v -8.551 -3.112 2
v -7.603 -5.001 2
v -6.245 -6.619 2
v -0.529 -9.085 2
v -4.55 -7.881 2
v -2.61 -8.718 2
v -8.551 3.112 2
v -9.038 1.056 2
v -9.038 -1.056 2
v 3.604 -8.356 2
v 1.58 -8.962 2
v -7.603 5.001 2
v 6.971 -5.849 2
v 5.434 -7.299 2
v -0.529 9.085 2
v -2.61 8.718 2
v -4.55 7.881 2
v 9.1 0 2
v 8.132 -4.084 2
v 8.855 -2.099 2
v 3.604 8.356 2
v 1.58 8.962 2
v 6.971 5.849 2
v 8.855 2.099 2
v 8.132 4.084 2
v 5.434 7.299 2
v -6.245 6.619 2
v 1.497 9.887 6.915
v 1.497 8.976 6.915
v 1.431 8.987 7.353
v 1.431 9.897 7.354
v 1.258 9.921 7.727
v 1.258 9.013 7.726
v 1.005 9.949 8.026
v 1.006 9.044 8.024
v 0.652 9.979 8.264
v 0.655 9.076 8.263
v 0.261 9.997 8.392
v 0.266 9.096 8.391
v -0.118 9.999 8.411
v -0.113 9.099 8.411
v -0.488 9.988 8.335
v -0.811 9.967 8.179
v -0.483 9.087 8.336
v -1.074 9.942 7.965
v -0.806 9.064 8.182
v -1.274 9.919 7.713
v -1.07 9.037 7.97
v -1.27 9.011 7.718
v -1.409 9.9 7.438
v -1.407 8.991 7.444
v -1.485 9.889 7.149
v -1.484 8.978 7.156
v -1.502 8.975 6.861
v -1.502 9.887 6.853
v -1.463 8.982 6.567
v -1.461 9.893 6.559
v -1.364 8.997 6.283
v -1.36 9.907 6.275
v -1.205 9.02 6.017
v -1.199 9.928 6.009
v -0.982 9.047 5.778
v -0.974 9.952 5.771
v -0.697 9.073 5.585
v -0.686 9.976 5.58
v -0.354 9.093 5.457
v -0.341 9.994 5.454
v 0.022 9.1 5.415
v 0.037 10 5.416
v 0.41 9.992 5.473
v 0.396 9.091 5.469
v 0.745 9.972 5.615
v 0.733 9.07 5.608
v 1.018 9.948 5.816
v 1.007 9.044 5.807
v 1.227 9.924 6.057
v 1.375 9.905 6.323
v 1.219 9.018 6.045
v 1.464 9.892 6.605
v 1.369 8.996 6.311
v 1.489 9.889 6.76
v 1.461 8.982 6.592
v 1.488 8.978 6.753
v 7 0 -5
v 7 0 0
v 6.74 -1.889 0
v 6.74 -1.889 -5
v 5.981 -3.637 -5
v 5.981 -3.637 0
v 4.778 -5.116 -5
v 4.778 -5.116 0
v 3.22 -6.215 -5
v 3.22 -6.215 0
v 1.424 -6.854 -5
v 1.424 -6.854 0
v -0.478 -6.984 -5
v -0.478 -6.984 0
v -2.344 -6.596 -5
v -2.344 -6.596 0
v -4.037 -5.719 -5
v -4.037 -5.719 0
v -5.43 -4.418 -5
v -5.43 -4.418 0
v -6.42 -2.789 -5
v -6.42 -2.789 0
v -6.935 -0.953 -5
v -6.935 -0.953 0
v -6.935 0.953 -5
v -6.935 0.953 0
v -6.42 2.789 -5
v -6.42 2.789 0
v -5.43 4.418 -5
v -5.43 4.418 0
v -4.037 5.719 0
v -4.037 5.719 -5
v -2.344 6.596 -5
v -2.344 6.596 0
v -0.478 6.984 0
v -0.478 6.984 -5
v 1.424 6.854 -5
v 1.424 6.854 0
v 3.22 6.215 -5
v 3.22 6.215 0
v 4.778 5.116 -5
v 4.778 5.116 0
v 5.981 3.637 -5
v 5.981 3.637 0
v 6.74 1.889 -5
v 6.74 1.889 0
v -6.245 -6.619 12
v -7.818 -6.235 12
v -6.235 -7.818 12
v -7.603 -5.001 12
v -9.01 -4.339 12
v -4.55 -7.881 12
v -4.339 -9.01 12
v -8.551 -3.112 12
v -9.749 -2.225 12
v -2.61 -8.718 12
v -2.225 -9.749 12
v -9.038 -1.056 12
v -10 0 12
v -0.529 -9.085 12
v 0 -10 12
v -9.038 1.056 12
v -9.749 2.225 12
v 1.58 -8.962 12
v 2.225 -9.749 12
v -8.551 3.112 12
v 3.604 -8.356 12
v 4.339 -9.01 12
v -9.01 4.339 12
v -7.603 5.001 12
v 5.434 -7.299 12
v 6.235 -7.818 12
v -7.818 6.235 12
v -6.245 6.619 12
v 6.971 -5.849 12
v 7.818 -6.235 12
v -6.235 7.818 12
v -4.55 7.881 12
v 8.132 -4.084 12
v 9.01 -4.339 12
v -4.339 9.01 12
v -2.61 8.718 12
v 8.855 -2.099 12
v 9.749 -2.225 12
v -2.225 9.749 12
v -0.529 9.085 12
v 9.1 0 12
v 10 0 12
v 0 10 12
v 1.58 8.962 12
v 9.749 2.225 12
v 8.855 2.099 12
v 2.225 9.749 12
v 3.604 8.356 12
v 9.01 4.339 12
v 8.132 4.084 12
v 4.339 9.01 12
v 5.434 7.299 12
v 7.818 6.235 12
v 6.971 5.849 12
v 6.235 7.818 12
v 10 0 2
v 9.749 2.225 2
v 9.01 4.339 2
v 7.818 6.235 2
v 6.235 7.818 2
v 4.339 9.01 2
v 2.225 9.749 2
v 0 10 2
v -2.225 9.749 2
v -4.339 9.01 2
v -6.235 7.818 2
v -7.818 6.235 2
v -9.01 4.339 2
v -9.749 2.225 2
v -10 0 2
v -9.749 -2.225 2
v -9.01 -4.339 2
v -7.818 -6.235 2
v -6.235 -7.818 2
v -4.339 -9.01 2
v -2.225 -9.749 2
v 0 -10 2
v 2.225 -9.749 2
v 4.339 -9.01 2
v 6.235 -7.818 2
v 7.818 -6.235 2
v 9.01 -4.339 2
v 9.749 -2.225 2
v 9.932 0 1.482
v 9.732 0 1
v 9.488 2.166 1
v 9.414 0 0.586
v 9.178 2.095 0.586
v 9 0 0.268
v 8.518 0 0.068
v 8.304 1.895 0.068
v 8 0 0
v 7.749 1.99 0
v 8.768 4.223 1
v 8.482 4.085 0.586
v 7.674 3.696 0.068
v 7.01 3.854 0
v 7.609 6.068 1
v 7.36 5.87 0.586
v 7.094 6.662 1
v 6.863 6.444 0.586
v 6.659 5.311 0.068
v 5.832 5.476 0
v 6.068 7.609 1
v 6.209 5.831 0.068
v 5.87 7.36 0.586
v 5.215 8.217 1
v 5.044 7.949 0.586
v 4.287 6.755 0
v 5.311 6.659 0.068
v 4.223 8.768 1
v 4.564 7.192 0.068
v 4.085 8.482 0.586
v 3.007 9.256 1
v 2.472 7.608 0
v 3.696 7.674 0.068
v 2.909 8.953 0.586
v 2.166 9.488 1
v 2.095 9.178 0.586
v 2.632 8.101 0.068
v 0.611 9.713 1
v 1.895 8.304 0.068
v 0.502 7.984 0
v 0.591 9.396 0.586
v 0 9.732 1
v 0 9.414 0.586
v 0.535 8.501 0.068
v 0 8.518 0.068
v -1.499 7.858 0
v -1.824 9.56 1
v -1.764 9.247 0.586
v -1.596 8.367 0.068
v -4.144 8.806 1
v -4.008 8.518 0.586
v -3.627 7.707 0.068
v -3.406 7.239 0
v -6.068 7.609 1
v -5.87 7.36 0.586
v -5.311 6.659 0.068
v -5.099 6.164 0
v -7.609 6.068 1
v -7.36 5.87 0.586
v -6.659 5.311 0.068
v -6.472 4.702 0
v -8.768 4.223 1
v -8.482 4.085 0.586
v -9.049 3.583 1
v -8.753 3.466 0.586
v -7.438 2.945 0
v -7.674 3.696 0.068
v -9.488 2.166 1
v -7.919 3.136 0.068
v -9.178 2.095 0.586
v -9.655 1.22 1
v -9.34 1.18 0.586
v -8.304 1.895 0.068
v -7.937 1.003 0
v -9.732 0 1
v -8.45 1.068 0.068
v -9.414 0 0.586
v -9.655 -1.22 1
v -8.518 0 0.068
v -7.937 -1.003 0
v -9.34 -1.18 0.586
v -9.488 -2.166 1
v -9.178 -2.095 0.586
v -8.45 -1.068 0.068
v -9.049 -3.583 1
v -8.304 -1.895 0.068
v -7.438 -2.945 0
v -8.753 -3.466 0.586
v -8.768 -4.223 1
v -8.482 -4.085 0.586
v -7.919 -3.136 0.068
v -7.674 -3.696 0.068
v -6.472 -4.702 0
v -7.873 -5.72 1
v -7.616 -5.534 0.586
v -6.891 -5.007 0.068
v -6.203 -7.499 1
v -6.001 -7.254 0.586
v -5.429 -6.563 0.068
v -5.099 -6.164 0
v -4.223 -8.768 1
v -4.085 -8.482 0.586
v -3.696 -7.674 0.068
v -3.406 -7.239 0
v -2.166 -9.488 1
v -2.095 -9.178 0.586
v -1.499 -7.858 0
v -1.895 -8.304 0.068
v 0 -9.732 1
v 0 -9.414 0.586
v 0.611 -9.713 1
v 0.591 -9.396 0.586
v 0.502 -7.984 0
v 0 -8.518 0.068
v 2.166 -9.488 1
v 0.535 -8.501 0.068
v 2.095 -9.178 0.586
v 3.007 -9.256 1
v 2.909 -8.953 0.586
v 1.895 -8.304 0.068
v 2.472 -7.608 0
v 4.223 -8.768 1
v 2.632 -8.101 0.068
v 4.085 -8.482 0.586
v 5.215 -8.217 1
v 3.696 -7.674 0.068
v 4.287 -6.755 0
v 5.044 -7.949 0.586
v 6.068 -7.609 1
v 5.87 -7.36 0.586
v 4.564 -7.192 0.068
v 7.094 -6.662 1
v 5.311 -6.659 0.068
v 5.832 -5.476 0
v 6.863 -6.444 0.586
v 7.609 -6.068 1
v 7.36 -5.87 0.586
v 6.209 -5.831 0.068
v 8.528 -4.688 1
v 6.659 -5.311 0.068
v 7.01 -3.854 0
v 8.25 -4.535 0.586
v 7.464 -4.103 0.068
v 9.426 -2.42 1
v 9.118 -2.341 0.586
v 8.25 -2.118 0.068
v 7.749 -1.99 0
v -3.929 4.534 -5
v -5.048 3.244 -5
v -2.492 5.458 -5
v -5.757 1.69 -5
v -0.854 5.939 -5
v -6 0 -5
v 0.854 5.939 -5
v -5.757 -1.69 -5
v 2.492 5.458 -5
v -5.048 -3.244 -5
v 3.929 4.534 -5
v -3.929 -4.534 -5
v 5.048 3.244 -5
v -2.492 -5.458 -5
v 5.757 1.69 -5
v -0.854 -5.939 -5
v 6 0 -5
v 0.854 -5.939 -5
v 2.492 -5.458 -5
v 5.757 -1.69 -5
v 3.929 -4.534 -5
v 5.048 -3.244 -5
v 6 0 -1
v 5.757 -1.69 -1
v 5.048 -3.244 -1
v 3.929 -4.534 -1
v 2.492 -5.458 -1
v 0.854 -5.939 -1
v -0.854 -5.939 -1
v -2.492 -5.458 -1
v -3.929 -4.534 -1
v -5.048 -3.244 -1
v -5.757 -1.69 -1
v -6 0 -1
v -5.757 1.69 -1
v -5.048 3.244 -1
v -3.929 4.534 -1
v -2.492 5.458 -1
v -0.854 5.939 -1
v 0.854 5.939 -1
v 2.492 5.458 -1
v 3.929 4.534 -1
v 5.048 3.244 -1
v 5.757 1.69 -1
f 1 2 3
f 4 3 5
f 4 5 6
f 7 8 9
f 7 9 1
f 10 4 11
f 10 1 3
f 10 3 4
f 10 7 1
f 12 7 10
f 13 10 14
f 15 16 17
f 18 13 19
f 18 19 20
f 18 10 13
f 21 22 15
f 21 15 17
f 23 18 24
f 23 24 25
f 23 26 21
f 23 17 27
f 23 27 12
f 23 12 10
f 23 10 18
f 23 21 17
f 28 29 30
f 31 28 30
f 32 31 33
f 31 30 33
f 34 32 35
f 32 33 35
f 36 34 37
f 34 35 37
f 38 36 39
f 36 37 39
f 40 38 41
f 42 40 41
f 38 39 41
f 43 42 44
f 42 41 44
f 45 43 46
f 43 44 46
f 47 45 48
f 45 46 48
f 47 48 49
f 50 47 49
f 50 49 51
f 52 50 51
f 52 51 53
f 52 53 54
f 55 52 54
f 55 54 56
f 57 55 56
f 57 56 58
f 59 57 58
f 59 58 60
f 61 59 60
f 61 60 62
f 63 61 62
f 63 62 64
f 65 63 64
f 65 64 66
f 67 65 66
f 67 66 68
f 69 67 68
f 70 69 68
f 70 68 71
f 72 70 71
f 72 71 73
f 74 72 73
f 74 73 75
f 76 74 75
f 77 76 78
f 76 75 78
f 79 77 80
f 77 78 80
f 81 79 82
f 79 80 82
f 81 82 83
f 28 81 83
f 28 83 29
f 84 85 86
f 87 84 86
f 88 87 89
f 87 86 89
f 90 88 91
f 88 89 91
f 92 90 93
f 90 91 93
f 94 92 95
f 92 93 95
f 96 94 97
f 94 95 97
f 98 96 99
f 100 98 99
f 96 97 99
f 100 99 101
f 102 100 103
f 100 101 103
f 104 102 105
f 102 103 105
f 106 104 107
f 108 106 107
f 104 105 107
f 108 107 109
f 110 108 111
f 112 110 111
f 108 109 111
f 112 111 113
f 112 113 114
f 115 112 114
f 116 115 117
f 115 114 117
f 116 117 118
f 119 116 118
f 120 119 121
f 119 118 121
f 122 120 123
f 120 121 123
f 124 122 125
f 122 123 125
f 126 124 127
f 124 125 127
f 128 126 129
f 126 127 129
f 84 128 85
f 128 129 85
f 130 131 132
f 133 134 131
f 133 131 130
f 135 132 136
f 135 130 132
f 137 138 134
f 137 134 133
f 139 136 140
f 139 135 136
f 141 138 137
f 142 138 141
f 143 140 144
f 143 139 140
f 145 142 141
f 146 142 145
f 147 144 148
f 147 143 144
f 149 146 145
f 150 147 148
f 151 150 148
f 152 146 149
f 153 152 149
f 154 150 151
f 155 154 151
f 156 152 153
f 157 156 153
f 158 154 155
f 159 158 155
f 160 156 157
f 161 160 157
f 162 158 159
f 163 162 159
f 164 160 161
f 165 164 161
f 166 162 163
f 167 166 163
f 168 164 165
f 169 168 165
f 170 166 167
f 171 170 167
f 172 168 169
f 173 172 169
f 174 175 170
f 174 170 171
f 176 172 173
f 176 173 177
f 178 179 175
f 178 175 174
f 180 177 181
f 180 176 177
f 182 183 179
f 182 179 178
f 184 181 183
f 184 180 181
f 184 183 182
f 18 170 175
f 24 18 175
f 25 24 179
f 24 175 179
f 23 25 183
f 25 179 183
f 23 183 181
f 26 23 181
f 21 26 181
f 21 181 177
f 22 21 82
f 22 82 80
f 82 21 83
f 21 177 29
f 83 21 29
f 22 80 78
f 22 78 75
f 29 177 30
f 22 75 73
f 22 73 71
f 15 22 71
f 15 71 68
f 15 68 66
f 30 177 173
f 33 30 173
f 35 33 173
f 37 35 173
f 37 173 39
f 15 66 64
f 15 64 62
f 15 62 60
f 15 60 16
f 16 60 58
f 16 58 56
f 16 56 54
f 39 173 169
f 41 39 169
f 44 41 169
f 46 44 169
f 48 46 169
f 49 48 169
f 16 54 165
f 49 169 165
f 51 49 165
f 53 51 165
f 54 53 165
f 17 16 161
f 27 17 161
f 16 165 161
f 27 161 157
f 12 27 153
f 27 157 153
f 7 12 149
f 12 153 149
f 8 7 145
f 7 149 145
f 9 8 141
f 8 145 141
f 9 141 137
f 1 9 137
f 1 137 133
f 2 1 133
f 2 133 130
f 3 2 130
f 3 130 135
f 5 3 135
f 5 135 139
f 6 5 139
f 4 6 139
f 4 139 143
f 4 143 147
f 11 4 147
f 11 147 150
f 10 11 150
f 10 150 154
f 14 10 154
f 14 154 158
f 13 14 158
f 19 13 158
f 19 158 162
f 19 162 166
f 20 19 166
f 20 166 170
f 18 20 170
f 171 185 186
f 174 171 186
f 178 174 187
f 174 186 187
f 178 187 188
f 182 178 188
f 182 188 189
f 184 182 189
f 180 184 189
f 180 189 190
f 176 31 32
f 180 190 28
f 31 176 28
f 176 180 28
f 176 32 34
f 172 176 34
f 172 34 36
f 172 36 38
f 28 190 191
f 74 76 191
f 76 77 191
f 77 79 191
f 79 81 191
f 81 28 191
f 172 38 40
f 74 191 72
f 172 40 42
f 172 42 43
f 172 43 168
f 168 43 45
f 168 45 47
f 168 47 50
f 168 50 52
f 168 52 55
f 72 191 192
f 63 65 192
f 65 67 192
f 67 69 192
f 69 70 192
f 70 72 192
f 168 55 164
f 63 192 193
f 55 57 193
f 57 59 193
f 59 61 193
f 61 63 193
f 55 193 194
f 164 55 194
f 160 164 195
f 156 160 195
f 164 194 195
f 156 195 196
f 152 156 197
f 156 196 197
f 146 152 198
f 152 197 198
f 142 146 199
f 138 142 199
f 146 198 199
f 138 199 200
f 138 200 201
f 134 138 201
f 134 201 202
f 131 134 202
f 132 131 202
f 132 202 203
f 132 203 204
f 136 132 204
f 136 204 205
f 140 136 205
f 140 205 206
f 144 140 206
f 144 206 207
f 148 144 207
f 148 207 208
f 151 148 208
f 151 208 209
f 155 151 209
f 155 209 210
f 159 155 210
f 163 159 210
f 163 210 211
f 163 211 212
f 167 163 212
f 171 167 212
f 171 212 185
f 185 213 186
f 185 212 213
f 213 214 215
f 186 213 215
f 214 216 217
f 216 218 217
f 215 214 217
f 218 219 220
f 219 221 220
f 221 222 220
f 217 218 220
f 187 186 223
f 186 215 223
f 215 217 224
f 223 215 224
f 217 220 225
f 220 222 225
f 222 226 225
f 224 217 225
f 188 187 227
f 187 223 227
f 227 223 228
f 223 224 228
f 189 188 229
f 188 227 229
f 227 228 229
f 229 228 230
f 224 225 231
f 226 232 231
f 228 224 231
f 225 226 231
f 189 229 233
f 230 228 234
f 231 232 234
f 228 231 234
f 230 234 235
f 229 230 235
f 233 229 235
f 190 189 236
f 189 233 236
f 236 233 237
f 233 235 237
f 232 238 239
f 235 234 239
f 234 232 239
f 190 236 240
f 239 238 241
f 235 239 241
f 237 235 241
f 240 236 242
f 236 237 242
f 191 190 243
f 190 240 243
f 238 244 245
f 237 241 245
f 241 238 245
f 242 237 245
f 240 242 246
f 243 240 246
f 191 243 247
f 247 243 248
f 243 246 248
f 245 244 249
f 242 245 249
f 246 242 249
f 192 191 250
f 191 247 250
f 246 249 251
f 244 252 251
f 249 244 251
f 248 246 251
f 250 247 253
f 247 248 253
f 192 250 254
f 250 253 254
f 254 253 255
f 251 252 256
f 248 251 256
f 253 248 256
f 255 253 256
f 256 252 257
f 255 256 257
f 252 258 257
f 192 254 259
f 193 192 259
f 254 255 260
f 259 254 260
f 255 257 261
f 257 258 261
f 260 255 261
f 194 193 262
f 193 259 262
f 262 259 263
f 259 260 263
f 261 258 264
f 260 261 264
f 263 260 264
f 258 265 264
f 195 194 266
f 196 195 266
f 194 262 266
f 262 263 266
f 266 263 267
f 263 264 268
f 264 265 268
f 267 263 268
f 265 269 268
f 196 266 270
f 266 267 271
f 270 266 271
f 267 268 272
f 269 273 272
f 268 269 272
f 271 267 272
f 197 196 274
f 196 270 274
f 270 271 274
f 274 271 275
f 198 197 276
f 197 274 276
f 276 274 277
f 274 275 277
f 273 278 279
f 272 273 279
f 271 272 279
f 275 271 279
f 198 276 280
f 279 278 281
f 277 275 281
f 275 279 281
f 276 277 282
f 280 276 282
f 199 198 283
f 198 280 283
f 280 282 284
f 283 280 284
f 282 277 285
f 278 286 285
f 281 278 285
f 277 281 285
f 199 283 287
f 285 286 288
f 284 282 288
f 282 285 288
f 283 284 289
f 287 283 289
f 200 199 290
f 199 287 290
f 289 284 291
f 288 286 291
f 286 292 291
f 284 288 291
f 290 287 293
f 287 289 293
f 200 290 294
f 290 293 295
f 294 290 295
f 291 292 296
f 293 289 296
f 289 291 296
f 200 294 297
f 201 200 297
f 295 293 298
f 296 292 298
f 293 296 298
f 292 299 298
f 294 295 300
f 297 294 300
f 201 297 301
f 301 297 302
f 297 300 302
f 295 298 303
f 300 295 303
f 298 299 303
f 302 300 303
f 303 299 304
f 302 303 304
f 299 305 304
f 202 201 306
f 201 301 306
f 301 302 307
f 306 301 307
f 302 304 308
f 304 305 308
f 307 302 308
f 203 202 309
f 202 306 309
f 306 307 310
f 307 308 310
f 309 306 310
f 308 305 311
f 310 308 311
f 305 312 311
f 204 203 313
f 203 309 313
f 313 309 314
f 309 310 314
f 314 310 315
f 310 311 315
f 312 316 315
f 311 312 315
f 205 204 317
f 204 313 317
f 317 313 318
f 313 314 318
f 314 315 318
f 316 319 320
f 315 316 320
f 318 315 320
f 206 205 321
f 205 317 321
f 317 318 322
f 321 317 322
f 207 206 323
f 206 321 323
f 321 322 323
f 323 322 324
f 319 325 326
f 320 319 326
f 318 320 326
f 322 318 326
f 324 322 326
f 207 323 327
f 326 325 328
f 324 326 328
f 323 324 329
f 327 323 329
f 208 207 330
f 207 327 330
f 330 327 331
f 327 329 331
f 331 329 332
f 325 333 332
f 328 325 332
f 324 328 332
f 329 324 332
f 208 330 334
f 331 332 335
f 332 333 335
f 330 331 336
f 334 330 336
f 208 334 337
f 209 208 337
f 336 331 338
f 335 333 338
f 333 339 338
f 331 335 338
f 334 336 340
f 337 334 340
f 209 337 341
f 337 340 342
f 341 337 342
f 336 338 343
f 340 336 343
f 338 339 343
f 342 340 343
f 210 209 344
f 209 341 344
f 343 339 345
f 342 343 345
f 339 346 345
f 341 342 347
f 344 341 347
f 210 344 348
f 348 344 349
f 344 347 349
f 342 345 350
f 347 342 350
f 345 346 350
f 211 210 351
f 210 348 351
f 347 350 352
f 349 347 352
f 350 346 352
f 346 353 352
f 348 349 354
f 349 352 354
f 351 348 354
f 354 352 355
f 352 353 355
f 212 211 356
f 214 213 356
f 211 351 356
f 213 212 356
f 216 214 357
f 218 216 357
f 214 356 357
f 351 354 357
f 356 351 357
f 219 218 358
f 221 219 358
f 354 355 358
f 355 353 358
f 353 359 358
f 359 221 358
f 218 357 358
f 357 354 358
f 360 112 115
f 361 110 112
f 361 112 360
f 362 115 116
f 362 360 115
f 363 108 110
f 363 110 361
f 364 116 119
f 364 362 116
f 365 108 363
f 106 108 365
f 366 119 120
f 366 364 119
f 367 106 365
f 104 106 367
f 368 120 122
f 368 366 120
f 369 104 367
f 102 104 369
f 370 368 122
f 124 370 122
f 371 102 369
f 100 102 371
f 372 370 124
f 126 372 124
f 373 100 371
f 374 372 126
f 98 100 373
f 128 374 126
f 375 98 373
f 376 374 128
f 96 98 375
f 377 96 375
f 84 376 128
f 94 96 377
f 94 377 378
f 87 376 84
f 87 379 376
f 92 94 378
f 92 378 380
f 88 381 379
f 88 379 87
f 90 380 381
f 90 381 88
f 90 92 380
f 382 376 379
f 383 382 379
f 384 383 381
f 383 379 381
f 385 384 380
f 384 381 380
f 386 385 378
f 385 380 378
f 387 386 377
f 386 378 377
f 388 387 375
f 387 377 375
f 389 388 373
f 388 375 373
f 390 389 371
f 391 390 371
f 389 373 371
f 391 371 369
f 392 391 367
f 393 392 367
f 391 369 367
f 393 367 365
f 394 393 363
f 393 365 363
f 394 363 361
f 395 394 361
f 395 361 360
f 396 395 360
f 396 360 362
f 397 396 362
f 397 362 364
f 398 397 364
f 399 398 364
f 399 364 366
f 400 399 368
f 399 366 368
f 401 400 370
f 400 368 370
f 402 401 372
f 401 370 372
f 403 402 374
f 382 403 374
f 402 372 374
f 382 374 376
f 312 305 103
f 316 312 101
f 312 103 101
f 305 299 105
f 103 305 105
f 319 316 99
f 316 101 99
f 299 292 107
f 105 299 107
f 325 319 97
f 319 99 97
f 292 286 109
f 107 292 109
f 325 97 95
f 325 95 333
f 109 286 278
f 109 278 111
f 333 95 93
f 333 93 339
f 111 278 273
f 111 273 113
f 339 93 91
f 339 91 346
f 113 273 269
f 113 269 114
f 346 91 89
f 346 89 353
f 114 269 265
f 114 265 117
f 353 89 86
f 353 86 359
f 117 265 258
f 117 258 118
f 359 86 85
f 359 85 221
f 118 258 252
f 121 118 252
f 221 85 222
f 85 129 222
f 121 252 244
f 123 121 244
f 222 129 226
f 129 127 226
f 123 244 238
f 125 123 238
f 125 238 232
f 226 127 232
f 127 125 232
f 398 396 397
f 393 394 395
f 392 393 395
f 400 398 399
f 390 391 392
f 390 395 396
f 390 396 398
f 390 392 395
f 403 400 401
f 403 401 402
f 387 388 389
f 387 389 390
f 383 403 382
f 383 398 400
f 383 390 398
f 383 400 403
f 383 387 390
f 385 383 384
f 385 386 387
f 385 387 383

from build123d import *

# Parameters (mm, degrees)
SKETCH_R        = 10
PAD_DEPTH       = 12
SKETCH001_R     = 9.1
POCKET_DEPTH    = 10
SKETCH002_R     = 7
PAD001_DEPTH    = 5
SKETCH003_R     = 6
POCKET001_DEPTH = 4
FILLET_R        = 2
SKETCH004_R     = 1.5
POCKET002_DEPTH = 11


with BuildPart() as part:
    # Sketch → Pad (new body)
    with BuildSketch(Plane.XY):
        Circle(SKETCH_R)
    extrude(amount=PAD_DEPTH)

    # Sketch001 (on Face3 of Pad) → Pocket (cut)
    with BuildSketch(Plane.XY.offset(12)):
        Circle(SKETCH001_R)
    extrude(amount=-POCKET_DEPTH, mode=Mode.SUBTRACT)

    # Sketch002 (on Face2 of Pocket) → Pad001 (join)
    with BuildSketch(Plane(origin=(0, 0, 0), x_dir=(1, 0, 0), z_dir=(0, 0, -1))):
        Circle(SKETCH002_R)
    extrude(amount=PAD001_DEPTH)

    # Sketch003 (on Face6 of Pad001) → Pocket001 (cut)
    with BuildSketch(Plane(origin=(0, 0, -5), x_dir=(1, 0, 0), z_dir=(0, 0, -1))):
        Circle(SKETCH003_R)
    extrude(amount=-POCKET001_DEPTH, mode=Mode.SUBTRACT)

    # Fillet
    fillet_edges = [part.edges().sort_by_distance(p)[0] for p in [
        (-10, 0, 0),
    ]]
    fillet(fillet_edges, radius=FILLET_R)

    # Sketch004 → Pocket002 (cut)
    with BuildSketch(Plane.XZ):
        with Locations((-0.003423, 6.915163)):
            Circle(SKETCH004_R)
    extrude(amount=-POCKET002_DEPTH, mode=Mode.SUBTRACT)


solid = part.part
